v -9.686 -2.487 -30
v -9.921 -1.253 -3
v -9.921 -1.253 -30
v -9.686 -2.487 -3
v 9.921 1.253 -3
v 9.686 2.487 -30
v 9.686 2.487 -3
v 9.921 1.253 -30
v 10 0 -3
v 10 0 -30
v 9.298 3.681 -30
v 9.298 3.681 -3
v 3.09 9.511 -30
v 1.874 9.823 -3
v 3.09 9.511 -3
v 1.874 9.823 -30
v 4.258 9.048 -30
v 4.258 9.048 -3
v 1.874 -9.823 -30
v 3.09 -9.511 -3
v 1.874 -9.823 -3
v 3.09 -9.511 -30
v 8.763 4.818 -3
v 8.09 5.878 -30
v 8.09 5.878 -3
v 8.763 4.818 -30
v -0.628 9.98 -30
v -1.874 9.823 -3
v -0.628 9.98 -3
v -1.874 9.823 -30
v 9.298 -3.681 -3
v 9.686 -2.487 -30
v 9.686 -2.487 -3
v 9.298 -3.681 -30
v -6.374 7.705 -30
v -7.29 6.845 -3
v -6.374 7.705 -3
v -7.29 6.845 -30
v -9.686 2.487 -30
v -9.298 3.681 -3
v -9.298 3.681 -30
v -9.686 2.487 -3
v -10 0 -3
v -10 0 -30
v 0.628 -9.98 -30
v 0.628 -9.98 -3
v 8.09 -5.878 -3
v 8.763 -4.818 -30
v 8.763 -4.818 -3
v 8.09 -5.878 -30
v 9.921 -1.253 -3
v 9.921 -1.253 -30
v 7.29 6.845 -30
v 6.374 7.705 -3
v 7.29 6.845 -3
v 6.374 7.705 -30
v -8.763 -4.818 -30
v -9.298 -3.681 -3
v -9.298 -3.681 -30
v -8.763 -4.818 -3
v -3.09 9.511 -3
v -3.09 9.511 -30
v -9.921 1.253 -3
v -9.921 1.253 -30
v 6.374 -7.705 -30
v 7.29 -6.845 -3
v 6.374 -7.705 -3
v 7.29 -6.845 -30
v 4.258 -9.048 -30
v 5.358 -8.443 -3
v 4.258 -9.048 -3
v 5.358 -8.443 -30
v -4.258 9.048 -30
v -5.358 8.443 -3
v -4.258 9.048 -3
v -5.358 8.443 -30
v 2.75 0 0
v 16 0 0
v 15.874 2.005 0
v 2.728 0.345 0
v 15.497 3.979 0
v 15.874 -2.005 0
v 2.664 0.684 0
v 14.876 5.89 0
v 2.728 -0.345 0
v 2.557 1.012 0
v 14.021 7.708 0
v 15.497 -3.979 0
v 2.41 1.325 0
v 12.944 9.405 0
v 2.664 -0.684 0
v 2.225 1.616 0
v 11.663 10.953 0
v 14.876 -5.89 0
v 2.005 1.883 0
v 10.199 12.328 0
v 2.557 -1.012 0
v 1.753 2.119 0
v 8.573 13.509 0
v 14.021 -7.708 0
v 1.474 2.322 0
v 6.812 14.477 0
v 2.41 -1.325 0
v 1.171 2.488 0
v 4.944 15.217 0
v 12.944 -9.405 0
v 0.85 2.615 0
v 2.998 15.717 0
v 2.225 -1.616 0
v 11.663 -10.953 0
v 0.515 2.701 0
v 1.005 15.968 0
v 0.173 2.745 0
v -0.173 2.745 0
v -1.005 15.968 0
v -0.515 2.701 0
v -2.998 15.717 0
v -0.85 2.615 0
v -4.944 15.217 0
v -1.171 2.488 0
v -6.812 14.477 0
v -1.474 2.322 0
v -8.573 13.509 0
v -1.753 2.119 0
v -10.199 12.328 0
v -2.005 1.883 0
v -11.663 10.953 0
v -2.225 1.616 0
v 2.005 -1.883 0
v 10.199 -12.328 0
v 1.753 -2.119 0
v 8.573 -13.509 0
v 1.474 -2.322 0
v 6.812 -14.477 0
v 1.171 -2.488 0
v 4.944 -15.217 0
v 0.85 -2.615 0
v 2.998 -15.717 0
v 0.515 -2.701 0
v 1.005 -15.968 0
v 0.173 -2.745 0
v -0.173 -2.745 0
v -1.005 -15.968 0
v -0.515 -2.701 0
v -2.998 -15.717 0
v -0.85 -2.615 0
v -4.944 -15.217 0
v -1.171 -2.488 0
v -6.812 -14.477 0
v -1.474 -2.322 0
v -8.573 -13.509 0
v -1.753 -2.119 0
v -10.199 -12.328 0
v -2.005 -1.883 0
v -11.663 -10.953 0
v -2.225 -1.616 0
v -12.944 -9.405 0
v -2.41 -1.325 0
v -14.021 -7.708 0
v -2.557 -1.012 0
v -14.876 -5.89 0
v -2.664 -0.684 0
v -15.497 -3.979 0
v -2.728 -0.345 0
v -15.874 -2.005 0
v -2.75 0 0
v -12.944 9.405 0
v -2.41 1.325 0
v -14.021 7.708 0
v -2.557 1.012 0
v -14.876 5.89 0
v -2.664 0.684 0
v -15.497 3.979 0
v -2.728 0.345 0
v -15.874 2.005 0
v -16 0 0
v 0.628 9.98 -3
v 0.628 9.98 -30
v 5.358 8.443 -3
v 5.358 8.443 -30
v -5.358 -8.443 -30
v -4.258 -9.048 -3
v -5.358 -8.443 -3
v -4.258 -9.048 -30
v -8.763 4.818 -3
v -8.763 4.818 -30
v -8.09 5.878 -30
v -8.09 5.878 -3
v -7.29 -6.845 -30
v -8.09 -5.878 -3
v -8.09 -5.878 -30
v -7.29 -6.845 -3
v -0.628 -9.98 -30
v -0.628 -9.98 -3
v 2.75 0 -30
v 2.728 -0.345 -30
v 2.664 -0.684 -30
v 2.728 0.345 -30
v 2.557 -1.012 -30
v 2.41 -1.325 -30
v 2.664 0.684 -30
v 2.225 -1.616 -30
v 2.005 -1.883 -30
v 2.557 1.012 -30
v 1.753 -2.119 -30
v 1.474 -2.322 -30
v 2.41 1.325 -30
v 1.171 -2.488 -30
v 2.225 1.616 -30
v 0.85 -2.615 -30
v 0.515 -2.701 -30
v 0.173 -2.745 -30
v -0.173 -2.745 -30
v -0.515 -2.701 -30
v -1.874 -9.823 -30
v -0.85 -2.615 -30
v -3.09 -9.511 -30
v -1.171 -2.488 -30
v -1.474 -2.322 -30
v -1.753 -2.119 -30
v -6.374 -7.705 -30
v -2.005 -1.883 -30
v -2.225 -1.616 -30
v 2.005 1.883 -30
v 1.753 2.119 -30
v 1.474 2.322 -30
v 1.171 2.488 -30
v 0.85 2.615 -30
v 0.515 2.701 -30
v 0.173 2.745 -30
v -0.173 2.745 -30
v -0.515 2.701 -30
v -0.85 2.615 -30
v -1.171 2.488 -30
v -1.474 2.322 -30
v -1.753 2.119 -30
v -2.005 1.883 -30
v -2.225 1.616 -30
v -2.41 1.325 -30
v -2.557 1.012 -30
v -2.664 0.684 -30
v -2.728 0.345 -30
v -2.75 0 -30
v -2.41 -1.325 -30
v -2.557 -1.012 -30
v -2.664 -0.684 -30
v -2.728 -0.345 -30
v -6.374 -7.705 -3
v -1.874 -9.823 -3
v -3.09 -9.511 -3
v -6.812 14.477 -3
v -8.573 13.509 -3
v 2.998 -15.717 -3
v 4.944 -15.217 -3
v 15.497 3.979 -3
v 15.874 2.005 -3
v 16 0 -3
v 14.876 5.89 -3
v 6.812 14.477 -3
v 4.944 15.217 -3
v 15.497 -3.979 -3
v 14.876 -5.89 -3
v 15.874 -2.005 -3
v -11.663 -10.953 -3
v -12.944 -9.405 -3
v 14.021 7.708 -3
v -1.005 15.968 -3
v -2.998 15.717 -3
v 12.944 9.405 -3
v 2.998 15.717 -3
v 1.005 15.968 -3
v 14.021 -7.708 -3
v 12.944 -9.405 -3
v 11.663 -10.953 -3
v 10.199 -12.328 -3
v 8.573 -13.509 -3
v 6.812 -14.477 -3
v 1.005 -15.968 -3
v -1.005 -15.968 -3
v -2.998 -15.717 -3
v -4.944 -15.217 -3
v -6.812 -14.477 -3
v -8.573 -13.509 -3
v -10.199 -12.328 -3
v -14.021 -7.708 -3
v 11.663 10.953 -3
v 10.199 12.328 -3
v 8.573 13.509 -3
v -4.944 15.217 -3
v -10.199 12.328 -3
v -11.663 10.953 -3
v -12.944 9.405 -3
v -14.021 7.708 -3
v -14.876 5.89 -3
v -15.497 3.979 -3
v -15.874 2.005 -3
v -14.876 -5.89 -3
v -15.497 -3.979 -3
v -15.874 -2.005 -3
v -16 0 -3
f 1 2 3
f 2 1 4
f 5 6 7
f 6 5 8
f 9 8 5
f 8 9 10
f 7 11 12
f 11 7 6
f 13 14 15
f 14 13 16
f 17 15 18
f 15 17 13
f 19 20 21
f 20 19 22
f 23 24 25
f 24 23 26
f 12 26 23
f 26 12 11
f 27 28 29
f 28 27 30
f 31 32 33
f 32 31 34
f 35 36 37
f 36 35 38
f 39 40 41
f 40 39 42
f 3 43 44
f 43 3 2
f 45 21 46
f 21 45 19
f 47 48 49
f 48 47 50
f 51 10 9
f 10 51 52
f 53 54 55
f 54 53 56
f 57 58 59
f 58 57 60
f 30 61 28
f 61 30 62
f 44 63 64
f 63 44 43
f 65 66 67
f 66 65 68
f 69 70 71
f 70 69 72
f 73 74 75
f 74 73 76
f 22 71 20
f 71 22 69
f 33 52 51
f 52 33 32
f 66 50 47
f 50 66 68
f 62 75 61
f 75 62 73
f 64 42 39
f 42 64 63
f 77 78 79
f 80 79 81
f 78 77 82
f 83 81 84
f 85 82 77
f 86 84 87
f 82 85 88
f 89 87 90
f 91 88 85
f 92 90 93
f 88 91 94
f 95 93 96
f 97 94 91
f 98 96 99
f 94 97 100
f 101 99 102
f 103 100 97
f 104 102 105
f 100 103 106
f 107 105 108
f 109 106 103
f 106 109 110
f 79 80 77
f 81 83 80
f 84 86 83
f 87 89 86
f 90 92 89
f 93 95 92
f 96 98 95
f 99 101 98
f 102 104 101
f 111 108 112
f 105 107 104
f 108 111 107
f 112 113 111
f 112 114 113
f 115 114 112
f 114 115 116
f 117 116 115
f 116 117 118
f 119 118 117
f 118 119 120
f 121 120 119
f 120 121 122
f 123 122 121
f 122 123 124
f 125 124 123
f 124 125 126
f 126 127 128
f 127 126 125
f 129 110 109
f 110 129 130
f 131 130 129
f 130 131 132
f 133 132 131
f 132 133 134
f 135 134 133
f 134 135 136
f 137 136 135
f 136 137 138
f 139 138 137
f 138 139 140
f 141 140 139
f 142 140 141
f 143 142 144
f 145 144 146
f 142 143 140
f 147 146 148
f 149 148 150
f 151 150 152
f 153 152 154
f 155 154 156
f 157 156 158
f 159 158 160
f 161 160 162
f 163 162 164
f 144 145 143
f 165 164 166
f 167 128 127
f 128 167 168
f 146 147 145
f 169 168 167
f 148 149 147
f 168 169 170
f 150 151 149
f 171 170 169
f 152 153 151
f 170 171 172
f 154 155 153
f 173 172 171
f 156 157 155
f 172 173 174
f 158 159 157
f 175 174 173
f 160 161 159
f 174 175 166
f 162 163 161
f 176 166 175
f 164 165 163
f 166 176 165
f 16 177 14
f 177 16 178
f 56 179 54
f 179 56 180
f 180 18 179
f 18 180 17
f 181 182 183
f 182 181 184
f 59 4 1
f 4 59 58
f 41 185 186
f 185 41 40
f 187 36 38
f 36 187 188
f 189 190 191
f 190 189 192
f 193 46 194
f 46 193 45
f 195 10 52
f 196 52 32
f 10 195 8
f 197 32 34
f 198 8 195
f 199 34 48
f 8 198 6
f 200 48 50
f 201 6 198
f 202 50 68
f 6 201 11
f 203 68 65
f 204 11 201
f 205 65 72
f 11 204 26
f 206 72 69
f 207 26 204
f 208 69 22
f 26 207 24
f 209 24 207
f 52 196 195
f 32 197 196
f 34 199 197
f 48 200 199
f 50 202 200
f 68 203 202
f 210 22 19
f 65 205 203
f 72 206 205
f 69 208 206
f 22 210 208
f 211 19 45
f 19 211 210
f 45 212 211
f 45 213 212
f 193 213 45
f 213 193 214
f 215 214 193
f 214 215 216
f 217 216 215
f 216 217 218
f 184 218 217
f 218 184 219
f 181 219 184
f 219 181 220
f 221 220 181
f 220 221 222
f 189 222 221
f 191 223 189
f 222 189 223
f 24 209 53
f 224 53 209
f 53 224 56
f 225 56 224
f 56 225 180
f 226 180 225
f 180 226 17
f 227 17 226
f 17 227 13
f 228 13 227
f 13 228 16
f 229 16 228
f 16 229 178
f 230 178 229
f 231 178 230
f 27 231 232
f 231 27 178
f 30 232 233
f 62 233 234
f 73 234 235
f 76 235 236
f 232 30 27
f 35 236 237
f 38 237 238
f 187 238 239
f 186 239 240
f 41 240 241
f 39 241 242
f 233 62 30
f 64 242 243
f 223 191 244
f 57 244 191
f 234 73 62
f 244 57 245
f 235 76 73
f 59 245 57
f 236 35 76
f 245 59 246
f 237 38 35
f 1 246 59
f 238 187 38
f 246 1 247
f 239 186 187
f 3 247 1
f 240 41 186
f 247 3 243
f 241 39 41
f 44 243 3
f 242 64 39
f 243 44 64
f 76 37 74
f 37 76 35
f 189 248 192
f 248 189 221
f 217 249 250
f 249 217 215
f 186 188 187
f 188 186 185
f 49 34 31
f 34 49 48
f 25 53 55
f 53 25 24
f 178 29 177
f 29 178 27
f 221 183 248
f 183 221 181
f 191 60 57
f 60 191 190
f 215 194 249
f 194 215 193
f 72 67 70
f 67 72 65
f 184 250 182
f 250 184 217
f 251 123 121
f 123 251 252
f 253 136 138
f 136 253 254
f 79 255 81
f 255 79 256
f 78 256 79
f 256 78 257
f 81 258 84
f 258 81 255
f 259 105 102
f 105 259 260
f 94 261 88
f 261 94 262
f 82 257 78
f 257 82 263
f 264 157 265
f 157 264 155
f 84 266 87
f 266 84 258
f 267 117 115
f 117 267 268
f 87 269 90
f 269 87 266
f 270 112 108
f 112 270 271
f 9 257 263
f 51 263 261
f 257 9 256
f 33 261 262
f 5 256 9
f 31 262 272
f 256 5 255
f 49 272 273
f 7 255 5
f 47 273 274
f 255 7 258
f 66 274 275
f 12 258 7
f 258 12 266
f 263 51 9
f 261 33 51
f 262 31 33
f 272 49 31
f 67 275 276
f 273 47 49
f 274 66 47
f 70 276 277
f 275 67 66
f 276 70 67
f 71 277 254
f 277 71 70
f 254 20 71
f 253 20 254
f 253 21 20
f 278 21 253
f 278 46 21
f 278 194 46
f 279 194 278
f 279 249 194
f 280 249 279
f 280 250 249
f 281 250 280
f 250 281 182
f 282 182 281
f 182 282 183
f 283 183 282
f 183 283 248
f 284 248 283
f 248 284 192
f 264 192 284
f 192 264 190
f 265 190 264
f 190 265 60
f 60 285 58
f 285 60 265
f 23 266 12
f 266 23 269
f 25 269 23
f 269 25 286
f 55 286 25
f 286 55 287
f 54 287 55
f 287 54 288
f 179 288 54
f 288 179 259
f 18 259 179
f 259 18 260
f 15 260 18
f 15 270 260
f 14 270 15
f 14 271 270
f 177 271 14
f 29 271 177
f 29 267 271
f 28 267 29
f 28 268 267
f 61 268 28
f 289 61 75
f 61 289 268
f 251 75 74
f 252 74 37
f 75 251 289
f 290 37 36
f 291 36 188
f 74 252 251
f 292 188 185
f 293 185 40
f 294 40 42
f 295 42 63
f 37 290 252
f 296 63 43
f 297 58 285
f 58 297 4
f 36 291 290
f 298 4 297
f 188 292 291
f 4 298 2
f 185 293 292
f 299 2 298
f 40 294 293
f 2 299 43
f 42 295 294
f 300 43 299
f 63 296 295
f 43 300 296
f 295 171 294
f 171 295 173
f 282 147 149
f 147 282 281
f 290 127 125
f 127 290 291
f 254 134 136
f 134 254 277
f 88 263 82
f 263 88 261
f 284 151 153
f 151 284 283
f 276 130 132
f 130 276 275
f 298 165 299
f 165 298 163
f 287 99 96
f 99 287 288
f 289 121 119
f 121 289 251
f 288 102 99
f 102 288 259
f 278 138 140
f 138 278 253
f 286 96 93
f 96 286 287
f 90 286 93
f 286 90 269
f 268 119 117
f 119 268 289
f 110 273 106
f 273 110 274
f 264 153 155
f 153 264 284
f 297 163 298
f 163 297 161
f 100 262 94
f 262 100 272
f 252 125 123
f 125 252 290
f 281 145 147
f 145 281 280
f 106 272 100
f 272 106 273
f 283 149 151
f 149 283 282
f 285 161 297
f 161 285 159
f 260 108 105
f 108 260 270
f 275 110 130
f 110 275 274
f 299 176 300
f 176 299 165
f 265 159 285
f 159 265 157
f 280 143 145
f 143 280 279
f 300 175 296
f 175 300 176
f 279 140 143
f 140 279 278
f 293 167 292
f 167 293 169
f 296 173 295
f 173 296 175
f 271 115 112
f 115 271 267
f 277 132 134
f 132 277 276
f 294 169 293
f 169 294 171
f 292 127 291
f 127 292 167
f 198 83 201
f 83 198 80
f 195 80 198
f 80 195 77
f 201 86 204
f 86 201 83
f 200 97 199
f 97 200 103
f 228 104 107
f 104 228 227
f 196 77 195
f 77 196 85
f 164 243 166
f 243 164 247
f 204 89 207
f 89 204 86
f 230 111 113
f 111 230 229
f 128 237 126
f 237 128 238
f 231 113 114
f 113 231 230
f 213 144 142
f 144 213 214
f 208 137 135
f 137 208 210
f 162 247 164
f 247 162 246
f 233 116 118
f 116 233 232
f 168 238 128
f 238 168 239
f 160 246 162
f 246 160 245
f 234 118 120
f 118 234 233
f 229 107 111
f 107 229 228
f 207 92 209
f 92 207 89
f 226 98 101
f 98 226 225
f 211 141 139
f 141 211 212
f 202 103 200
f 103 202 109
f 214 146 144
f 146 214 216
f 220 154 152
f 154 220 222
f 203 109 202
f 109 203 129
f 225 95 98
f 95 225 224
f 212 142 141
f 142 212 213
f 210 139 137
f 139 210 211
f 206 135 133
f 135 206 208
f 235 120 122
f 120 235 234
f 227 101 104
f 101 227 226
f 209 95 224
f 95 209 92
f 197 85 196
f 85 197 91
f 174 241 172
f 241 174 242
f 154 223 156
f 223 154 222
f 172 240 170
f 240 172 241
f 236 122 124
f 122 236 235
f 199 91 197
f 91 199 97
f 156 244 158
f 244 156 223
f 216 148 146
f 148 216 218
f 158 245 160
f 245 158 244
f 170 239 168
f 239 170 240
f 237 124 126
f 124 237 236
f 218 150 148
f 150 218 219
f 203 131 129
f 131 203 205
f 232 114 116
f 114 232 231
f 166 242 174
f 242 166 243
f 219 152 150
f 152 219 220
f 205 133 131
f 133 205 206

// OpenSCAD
$fn = 50;


difference() {
	union() {
		translate(v = [0, 0, -30.0000000000]) {
			cylinder(h = 30, r = 10.0000000000);
		}
		translate(v = [0, 0, -3.0000000000]) {
			cylinder(h = 3, r = 16.0000000000);
		}
	}
	union() {
		#translate(v = [0, 0, -30]) {
			cylinder(h = 30, r = 2.7500000000);
		}
	}
}
